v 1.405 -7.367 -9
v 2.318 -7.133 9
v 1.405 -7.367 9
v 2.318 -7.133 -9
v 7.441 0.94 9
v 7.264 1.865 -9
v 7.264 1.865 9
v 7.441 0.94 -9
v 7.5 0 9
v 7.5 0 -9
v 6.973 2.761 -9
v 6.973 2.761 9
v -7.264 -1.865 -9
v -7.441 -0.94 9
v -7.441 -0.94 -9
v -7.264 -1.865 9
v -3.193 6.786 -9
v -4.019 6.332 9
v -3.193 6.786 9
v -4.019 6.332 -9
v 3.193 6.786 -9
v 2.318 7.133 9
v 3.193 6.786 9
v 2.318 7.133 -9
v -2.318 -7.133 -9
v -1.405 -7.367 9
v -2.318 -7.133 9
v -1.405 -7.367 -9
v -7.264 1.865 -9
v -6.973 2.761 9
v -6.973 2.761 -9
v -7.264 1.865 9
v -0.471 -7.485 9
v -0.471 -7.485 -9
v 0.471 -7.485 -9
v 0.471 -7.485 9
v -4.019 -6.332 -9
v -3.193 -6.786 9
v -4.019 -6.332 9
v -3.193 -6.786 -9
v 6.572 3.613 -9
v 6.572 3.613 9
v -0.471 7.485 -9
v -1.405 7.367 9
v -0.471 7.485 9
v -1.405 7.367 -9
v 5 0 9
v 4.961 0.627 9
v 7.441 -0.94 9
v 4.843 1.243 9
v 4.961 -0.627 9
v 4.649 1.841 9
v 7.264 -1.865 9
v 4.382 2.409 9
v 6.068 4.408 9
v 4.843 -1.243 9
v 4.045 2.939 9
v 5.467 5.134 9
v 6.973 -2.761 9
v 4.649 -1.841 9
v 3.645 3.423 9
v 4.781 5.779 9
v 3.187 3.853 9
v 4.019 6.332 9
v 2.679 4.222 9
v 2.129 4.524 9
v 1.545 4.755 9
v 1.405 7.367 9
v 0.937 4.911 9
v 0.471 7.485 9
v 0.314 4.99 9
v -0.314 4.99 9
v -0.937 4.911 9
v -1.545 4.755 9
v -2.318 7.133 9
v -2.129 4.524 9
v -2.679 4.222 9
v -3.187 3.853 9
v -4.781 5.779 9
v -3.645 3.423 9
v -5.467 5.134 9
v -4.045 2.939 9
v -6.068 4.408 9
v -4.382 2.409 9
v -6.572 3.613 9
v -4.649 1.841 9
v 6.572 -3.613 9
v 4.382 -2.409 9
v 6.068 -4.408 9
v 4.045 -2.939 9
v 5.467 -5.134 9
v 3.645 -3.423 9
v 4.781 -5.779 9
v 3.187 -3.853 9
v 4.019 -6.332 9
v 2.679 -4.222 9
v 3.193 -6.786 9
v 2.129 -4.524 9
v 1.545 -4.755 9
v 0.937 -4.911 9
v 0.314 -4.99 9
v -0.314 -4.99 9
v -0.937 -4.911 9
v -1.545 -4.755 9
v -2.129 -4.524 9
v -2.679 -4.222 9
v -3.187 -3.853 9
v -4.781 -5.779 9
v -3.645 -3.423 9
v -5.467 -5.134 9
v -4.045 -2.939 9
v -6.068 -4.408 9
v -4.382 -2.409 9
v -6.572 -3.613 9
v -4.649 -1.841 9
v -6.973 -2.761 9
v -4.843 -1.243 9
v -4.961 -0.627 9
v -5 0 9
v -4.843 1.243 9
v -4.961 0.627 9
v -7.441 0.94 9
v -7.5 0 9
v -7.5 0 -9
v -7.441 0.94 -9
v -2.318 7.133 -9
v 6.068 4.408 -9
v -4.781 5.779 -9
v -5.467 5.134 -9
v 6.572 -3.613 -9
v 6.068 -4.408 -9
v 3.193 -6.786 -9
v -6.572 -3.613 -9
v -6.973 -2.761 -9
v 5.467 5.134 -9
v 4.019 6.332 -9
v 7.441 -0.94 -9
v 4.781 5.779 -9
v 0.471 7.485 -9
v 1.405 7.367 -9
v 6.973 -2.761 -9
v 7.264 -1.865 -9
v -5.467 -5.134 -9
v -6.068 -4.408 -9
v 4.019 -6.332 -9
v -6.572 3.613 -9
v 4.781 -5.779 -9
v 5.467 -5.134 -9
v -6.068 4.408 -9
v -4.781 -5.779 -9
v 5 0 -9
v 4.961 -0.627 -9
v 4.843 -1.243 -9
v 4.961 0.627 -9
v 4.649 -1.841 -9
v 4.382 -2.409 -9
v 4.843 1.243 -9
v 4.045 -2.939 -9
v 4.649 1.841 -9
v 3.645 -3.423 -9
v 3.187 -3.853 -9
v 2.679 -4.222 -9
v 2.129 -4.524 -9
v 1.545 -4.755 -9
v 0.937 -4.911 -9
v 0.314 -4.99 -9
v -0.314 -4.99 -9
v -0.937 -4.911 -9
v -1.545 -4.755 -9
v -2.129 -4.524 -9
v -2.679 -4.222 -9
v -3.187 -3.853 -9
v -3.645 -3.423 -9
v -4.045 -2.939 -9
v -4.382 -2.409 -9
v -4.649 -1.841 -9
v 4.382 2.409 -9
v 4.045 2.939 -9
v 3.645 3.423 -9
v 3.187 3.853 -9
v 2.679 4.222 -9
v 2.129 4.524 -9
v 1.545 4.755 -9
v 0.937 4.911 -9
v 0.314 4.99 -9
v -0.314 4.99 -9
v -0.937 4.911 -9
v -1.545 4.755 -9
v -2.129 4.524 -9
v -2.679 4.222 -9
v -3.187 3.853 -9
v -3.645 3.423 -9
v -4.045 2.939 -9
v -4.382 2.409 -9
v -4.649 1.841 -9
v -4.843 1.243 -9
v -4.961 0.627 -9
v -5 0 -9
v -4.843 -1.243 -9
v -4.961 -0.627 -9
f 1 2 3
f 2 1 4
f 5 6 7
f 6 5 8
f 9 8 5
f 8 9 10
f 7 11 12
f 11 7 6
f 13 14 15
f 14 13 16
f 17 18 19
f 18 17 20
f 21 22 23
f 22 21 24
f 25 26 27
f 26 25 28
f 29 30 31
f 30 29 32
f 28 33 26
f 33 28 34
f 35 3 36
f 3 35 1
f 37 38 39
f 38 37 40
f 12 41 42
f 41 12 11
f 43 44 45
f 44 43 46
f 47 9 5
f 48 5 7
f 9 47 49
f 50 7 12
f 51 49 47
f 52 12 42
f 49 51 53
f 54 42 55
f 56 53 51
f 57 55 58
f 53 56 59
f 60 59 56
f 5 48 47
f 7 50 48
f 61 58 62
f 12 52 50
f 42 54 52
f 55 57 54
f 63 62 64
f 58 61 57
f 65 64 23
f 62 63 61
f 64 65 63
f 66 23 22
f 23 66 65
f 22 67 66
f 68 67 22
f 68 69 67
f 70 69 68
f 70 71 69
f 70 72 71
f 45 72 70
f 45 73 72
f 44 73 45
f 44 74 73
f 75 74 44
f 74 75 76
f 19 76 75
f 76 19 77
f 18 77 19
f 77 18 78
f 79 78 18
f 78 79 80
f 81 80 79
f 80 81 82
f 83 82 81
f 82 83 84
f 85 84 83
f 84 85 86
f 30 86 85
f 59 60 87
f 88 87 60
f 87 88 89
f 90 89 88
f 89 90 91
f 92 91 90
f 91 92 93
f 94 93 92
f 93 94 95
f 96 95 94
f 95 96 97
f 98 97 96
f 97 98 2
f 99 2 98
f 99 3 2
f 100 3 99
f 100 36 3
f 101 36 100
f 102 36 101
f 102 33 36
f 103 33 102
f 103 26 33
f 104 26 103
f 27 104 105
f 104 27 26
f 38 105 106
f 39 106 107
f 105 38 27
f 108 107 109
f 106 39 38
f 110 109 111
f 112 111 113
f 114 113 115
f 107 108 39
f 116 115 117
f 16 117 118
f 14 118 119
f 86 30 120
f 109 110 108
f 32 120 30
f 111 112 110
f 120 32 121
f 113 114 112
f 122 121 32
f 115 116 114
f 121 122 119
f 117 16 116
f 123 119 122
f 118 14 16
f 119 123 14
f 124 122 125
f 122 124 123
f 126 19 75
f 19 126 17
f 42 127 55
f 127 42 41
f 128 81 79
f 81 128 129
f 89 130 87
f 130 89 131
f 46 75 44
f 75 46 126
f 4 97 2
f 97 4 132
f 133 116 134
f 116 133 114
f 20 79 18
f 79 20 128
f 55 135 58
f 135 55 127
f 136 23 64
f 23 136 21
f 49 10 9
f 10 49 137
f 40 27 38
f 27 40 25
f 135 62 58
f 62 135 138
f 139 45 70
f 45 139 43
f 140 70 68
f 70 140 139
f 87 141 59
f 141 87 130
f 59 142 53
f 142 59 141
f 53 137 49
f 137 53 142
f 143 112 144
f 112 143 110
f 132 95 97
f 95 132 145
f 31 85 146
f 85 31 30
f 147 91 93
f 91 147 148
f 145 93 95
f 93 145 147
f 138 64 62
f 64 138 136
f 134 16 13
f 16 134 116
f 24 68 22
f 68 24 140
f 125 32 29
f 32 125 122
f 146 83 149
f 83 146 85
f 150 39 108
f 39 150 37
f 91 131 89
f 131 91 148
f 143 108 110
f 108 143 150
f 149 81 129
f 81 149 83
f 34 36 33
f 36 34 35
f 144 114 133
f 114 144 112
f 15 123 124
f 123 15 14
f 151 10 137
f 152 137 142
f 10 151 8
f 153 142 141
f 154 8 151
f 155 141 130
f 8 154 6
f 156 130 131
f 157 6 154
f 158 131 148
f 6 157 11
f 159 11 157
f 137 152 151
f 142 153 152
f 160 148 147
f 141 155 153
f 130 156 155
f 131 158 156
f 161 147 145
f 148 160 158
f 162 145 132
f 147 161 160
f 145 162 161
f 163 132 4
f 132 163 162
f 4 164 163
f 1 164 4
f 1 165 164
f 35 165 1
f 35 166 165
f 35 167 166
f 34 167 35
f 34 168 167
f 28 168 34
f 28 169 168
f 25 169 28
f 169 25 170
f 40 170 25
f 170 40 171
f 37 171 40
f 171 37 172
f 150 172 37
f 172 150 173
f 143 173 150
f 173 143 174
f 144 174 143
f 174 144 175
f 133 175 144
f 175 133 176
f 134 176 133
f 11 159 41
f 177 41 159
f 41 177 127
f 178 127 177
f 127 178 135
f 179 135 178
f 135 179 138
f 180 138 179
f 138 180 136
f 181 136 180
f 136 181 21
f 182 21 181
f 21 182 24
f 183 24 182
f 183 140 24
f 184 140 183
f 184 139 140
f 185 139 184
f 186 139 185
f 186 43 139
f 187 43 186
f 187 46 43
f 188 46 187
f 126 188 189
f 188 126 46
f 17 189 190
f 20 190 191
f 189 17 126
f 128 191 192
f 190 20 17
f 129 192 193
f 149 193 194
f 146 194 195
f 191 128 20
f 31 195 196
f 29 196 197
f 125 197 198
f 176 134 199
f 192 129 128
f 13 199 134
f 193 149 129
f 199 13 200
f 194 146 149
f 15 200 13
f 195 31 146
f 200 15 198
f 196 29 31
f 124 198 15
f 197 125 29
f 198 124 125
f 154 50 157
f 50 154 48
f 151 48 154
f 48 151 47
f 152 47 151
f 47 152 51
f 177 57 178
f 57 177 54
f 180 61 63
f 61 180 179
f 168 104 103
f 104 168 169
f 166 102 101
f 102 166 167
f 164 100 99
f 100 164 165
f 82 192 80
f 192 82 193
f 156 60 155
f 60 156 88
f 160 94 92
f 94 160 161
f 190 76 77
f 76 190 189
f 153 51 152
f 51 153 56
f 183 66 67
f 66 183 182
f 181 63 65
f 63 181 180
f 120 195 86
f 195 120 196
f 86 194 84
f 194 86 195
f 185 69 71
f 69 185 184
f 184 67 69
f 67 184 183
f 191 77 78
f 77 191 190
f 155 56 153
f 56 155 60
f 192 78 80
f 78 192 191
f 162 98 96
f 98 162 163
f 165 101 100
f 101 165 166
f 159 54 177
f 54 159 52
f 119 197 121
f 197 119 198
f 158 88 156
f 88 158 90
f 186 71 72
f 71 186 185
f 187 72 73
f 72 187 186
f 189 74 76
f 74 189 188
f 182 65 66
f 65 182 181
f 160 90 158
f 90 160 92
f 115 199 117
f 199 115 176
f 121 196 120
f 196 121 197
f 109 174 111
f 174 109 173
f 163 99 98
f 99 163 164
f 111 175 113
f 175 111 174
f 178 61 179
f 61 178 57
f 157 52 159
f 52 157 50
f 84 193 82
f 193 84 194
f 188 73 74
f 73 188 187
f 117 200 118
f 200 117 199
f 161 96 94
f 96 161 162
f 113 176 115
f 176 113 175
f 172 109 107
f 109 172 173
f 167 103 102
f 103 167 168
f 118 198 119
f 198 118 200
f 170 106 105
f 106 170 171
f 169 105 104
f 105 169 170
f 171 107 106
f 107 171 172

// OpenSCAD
$fn = 50;


difference() {
	union() {
		translate(v = [0, 0, -9.0000000000]) {
			cylinder(h = 18, r = 7.5000000000);
		}
	}
	union() {
		translate(v = [0, 0, -100.0000000000]) {
			cylinder(h = 200, r = 5.0000000000);
		}
	}
}
